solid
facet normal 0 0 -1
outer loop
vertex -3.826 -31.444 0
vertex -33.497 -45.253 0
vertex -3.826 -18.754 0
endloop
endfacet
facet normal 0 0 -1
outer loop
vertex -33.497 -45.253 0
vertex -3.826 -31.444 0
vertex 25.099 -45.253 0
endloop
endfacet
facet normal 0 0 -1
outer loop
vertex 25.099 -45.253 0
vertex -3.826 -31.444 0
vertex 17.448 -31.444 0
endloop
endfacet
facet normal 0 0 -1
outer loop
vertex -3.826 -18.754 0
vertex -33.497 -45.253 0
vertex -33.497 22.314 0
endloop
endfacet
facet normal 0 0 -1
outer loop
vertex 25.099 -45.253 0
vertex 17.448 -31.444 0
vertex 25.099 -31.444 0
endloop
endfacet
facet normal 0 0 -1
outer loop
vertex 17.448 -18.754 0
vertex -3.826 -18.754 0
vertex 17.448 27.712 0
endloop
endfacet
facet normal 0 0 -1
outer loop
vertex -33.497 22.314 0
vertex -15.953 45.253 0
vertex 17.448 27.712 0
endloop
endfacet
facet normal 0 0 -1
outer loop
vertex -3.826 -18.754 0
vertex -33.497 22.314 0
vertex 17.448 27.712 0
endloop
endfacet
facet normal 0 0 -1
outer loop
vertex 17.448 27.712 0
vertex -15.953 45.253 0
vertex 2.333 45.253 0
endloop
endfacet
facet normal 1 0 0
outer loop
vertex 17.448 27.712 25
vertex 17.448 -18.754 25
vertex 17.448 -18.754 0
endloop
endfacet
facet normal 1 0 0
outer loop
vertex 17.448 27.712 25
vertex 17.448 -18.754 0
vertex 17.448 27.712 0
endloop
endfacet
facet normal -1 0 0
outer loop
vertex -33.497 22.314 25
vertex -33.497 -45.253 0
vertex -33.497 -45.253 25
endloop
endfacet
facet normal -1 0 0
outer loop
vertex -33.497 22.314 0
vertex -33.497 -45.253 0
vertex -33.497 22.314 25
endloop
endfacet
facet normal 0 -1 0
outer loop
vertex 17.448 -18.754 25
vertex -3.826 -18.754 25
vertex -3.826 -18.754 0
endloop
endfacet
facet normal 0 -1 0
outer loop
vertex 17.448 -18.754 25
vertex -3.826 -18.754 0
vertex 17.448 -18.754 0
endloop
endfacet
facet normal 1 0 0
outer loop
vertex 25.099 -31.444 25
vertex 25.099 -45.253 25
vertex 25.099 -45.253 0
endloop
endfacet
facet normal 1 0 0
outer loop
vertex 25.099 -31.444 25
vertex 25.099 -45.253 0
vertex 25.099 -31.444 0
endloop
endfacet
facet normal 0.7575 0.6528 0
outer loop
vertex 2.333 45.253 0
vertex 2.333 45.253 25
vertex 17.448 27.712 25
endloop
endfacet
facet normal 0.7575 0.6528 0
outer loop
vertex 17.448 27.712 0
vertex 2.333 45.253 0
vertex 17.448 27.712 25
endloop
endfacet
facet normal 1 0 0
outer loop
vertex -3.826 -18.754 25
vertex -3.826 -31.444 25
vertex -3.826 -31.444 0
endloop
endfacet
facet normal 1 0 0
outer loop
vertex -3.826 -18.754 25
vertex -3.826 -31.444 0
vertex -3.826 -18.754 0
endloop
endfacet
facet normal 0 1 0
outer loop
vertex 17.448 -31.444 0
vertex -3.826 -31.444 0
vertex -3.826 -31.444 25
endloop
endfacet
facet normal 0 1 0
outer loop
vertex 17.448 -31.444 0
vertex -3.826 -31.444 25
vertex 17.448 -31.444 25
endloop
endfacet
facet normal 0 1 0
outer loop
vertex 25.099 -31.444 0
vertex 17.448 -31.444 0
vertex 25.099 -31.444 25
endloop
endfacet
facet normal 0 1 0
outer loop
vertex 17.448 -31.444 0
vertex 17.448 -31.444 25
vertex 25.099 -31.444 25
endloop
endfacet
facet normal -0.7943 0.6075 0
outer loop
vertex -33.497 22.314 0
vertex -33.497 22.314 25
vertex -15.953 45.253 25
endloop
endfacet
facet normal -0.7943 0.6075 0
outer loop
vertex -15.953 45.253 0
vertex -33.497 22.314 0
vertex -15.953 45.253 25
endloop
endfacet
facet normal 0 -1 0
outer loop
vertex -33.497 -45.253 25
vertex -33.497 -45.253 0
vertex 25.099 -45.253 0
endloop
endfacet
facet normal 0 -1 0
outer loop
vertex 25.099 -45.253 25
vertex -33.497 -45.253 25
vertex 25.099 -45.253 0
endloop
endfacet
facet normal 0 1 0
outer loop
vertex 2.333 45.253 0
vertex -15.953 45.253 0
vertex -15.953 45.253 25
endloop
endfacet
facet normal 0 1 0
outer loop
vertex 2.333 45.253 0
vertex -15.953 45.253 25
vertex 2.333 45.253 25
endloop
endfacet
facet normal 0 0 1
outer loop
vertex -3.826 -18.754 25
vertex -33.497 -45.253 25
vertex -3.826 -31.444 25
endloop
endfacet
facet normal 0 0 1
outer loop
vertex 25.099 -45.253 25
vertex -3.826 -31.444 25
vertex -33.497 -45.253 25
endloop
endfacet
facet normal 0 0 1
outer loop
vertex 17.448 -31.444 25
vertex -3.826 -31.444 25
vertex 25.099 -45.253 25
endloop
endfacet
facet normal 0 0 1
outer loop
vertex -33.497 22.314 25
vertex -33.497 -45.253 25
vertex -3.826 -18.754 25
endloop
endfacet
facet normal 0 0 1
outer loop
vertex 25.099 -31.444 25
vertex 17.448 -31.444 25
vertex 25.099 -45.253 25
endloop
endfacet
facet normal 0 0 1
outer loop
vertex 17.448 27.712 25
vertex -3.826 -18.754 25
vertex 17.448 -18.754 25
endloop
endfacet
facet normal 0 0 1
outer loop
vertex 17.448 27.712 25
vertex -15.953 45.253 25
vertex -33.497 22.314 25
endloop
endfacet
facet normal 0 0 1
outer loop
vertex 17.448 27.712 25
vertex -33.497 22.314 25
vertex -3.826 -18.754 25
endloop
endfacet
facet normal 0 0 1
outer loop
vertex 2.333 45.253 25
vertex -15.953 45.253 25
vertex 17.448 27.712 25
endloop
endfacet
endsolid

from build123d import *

# Parameters (mm, degrees)
F0_W     = 66.9934824109
F0_H     = 90.5065238476
F1_DEPTH = 25
F2_W     = 16.0485785455
F2_H     = 76.6972787678
F3_DEPTH = 25.001
F5_DEPTH = 25.001
F6_W     = 21.2736960966
F6_H     = 12.6895736903
F7_DEPTH = 25.001
F8_W     = 8.3975102752
F8_H     = 13.8092450798
F9_DEPTH = 25.001


with BuildPart() as f1:
    # F0 (on Top) → F1 (new body)
    with BuildSketch(Plane.XY):
        Rectangle(F0_W, F0_H)
    extrude(amount=F1_DEPTH)

    # F2 (on face) → F3 (cut, through all)
    with BuildSketch(Plane.XY.offset(25)):
        with Locations((25.4724519327, 6.9046225399)):
            Rectangle(F2_W, F2_H)
    extrude(amount=-F3_DEPTH, mode=Mode.SUBTRACT)

    # F4 (on face) → F5 (cut, through all)
    with BuildSketch(Plane.XY.offset(25)):
        Polygon((-33.4967412055, 22.3143491894), (-15.9534495324, 45.2532619238), (-33.4967412055, 45.2532619238), align=None)
        Polygon((17.44816266, 45.2532619238), (2.3326422088, 45.2532619238), (17.44816266, 27.7117881924), align=None)
    extrude(amount=-F5_DEPTH, mode=Mode.SUBTRACT)

    # F6 (on face) → F7 (cut, through all)
    with BuildSketch(Plane.XY.offset(25)):
        with Locations((6.8113146117, -25.0992299989)):
            Rectangle(F6_W, F6_H)
    extrude(amount=-F7_DEPTH, mode=Mode.SUBTRACT)

    # F8 (on face) → F9 (cut, through all)
    with BuildSketch(Plane.XY.offset(25)):
        with Locations((29.2979860678, -38.3486393839)):
            Rectangle(F8_W, F8_H)
    extrude(amount=-F9_DEPTH, mode=Mode.SUBTRACT)


solid = f1.part
